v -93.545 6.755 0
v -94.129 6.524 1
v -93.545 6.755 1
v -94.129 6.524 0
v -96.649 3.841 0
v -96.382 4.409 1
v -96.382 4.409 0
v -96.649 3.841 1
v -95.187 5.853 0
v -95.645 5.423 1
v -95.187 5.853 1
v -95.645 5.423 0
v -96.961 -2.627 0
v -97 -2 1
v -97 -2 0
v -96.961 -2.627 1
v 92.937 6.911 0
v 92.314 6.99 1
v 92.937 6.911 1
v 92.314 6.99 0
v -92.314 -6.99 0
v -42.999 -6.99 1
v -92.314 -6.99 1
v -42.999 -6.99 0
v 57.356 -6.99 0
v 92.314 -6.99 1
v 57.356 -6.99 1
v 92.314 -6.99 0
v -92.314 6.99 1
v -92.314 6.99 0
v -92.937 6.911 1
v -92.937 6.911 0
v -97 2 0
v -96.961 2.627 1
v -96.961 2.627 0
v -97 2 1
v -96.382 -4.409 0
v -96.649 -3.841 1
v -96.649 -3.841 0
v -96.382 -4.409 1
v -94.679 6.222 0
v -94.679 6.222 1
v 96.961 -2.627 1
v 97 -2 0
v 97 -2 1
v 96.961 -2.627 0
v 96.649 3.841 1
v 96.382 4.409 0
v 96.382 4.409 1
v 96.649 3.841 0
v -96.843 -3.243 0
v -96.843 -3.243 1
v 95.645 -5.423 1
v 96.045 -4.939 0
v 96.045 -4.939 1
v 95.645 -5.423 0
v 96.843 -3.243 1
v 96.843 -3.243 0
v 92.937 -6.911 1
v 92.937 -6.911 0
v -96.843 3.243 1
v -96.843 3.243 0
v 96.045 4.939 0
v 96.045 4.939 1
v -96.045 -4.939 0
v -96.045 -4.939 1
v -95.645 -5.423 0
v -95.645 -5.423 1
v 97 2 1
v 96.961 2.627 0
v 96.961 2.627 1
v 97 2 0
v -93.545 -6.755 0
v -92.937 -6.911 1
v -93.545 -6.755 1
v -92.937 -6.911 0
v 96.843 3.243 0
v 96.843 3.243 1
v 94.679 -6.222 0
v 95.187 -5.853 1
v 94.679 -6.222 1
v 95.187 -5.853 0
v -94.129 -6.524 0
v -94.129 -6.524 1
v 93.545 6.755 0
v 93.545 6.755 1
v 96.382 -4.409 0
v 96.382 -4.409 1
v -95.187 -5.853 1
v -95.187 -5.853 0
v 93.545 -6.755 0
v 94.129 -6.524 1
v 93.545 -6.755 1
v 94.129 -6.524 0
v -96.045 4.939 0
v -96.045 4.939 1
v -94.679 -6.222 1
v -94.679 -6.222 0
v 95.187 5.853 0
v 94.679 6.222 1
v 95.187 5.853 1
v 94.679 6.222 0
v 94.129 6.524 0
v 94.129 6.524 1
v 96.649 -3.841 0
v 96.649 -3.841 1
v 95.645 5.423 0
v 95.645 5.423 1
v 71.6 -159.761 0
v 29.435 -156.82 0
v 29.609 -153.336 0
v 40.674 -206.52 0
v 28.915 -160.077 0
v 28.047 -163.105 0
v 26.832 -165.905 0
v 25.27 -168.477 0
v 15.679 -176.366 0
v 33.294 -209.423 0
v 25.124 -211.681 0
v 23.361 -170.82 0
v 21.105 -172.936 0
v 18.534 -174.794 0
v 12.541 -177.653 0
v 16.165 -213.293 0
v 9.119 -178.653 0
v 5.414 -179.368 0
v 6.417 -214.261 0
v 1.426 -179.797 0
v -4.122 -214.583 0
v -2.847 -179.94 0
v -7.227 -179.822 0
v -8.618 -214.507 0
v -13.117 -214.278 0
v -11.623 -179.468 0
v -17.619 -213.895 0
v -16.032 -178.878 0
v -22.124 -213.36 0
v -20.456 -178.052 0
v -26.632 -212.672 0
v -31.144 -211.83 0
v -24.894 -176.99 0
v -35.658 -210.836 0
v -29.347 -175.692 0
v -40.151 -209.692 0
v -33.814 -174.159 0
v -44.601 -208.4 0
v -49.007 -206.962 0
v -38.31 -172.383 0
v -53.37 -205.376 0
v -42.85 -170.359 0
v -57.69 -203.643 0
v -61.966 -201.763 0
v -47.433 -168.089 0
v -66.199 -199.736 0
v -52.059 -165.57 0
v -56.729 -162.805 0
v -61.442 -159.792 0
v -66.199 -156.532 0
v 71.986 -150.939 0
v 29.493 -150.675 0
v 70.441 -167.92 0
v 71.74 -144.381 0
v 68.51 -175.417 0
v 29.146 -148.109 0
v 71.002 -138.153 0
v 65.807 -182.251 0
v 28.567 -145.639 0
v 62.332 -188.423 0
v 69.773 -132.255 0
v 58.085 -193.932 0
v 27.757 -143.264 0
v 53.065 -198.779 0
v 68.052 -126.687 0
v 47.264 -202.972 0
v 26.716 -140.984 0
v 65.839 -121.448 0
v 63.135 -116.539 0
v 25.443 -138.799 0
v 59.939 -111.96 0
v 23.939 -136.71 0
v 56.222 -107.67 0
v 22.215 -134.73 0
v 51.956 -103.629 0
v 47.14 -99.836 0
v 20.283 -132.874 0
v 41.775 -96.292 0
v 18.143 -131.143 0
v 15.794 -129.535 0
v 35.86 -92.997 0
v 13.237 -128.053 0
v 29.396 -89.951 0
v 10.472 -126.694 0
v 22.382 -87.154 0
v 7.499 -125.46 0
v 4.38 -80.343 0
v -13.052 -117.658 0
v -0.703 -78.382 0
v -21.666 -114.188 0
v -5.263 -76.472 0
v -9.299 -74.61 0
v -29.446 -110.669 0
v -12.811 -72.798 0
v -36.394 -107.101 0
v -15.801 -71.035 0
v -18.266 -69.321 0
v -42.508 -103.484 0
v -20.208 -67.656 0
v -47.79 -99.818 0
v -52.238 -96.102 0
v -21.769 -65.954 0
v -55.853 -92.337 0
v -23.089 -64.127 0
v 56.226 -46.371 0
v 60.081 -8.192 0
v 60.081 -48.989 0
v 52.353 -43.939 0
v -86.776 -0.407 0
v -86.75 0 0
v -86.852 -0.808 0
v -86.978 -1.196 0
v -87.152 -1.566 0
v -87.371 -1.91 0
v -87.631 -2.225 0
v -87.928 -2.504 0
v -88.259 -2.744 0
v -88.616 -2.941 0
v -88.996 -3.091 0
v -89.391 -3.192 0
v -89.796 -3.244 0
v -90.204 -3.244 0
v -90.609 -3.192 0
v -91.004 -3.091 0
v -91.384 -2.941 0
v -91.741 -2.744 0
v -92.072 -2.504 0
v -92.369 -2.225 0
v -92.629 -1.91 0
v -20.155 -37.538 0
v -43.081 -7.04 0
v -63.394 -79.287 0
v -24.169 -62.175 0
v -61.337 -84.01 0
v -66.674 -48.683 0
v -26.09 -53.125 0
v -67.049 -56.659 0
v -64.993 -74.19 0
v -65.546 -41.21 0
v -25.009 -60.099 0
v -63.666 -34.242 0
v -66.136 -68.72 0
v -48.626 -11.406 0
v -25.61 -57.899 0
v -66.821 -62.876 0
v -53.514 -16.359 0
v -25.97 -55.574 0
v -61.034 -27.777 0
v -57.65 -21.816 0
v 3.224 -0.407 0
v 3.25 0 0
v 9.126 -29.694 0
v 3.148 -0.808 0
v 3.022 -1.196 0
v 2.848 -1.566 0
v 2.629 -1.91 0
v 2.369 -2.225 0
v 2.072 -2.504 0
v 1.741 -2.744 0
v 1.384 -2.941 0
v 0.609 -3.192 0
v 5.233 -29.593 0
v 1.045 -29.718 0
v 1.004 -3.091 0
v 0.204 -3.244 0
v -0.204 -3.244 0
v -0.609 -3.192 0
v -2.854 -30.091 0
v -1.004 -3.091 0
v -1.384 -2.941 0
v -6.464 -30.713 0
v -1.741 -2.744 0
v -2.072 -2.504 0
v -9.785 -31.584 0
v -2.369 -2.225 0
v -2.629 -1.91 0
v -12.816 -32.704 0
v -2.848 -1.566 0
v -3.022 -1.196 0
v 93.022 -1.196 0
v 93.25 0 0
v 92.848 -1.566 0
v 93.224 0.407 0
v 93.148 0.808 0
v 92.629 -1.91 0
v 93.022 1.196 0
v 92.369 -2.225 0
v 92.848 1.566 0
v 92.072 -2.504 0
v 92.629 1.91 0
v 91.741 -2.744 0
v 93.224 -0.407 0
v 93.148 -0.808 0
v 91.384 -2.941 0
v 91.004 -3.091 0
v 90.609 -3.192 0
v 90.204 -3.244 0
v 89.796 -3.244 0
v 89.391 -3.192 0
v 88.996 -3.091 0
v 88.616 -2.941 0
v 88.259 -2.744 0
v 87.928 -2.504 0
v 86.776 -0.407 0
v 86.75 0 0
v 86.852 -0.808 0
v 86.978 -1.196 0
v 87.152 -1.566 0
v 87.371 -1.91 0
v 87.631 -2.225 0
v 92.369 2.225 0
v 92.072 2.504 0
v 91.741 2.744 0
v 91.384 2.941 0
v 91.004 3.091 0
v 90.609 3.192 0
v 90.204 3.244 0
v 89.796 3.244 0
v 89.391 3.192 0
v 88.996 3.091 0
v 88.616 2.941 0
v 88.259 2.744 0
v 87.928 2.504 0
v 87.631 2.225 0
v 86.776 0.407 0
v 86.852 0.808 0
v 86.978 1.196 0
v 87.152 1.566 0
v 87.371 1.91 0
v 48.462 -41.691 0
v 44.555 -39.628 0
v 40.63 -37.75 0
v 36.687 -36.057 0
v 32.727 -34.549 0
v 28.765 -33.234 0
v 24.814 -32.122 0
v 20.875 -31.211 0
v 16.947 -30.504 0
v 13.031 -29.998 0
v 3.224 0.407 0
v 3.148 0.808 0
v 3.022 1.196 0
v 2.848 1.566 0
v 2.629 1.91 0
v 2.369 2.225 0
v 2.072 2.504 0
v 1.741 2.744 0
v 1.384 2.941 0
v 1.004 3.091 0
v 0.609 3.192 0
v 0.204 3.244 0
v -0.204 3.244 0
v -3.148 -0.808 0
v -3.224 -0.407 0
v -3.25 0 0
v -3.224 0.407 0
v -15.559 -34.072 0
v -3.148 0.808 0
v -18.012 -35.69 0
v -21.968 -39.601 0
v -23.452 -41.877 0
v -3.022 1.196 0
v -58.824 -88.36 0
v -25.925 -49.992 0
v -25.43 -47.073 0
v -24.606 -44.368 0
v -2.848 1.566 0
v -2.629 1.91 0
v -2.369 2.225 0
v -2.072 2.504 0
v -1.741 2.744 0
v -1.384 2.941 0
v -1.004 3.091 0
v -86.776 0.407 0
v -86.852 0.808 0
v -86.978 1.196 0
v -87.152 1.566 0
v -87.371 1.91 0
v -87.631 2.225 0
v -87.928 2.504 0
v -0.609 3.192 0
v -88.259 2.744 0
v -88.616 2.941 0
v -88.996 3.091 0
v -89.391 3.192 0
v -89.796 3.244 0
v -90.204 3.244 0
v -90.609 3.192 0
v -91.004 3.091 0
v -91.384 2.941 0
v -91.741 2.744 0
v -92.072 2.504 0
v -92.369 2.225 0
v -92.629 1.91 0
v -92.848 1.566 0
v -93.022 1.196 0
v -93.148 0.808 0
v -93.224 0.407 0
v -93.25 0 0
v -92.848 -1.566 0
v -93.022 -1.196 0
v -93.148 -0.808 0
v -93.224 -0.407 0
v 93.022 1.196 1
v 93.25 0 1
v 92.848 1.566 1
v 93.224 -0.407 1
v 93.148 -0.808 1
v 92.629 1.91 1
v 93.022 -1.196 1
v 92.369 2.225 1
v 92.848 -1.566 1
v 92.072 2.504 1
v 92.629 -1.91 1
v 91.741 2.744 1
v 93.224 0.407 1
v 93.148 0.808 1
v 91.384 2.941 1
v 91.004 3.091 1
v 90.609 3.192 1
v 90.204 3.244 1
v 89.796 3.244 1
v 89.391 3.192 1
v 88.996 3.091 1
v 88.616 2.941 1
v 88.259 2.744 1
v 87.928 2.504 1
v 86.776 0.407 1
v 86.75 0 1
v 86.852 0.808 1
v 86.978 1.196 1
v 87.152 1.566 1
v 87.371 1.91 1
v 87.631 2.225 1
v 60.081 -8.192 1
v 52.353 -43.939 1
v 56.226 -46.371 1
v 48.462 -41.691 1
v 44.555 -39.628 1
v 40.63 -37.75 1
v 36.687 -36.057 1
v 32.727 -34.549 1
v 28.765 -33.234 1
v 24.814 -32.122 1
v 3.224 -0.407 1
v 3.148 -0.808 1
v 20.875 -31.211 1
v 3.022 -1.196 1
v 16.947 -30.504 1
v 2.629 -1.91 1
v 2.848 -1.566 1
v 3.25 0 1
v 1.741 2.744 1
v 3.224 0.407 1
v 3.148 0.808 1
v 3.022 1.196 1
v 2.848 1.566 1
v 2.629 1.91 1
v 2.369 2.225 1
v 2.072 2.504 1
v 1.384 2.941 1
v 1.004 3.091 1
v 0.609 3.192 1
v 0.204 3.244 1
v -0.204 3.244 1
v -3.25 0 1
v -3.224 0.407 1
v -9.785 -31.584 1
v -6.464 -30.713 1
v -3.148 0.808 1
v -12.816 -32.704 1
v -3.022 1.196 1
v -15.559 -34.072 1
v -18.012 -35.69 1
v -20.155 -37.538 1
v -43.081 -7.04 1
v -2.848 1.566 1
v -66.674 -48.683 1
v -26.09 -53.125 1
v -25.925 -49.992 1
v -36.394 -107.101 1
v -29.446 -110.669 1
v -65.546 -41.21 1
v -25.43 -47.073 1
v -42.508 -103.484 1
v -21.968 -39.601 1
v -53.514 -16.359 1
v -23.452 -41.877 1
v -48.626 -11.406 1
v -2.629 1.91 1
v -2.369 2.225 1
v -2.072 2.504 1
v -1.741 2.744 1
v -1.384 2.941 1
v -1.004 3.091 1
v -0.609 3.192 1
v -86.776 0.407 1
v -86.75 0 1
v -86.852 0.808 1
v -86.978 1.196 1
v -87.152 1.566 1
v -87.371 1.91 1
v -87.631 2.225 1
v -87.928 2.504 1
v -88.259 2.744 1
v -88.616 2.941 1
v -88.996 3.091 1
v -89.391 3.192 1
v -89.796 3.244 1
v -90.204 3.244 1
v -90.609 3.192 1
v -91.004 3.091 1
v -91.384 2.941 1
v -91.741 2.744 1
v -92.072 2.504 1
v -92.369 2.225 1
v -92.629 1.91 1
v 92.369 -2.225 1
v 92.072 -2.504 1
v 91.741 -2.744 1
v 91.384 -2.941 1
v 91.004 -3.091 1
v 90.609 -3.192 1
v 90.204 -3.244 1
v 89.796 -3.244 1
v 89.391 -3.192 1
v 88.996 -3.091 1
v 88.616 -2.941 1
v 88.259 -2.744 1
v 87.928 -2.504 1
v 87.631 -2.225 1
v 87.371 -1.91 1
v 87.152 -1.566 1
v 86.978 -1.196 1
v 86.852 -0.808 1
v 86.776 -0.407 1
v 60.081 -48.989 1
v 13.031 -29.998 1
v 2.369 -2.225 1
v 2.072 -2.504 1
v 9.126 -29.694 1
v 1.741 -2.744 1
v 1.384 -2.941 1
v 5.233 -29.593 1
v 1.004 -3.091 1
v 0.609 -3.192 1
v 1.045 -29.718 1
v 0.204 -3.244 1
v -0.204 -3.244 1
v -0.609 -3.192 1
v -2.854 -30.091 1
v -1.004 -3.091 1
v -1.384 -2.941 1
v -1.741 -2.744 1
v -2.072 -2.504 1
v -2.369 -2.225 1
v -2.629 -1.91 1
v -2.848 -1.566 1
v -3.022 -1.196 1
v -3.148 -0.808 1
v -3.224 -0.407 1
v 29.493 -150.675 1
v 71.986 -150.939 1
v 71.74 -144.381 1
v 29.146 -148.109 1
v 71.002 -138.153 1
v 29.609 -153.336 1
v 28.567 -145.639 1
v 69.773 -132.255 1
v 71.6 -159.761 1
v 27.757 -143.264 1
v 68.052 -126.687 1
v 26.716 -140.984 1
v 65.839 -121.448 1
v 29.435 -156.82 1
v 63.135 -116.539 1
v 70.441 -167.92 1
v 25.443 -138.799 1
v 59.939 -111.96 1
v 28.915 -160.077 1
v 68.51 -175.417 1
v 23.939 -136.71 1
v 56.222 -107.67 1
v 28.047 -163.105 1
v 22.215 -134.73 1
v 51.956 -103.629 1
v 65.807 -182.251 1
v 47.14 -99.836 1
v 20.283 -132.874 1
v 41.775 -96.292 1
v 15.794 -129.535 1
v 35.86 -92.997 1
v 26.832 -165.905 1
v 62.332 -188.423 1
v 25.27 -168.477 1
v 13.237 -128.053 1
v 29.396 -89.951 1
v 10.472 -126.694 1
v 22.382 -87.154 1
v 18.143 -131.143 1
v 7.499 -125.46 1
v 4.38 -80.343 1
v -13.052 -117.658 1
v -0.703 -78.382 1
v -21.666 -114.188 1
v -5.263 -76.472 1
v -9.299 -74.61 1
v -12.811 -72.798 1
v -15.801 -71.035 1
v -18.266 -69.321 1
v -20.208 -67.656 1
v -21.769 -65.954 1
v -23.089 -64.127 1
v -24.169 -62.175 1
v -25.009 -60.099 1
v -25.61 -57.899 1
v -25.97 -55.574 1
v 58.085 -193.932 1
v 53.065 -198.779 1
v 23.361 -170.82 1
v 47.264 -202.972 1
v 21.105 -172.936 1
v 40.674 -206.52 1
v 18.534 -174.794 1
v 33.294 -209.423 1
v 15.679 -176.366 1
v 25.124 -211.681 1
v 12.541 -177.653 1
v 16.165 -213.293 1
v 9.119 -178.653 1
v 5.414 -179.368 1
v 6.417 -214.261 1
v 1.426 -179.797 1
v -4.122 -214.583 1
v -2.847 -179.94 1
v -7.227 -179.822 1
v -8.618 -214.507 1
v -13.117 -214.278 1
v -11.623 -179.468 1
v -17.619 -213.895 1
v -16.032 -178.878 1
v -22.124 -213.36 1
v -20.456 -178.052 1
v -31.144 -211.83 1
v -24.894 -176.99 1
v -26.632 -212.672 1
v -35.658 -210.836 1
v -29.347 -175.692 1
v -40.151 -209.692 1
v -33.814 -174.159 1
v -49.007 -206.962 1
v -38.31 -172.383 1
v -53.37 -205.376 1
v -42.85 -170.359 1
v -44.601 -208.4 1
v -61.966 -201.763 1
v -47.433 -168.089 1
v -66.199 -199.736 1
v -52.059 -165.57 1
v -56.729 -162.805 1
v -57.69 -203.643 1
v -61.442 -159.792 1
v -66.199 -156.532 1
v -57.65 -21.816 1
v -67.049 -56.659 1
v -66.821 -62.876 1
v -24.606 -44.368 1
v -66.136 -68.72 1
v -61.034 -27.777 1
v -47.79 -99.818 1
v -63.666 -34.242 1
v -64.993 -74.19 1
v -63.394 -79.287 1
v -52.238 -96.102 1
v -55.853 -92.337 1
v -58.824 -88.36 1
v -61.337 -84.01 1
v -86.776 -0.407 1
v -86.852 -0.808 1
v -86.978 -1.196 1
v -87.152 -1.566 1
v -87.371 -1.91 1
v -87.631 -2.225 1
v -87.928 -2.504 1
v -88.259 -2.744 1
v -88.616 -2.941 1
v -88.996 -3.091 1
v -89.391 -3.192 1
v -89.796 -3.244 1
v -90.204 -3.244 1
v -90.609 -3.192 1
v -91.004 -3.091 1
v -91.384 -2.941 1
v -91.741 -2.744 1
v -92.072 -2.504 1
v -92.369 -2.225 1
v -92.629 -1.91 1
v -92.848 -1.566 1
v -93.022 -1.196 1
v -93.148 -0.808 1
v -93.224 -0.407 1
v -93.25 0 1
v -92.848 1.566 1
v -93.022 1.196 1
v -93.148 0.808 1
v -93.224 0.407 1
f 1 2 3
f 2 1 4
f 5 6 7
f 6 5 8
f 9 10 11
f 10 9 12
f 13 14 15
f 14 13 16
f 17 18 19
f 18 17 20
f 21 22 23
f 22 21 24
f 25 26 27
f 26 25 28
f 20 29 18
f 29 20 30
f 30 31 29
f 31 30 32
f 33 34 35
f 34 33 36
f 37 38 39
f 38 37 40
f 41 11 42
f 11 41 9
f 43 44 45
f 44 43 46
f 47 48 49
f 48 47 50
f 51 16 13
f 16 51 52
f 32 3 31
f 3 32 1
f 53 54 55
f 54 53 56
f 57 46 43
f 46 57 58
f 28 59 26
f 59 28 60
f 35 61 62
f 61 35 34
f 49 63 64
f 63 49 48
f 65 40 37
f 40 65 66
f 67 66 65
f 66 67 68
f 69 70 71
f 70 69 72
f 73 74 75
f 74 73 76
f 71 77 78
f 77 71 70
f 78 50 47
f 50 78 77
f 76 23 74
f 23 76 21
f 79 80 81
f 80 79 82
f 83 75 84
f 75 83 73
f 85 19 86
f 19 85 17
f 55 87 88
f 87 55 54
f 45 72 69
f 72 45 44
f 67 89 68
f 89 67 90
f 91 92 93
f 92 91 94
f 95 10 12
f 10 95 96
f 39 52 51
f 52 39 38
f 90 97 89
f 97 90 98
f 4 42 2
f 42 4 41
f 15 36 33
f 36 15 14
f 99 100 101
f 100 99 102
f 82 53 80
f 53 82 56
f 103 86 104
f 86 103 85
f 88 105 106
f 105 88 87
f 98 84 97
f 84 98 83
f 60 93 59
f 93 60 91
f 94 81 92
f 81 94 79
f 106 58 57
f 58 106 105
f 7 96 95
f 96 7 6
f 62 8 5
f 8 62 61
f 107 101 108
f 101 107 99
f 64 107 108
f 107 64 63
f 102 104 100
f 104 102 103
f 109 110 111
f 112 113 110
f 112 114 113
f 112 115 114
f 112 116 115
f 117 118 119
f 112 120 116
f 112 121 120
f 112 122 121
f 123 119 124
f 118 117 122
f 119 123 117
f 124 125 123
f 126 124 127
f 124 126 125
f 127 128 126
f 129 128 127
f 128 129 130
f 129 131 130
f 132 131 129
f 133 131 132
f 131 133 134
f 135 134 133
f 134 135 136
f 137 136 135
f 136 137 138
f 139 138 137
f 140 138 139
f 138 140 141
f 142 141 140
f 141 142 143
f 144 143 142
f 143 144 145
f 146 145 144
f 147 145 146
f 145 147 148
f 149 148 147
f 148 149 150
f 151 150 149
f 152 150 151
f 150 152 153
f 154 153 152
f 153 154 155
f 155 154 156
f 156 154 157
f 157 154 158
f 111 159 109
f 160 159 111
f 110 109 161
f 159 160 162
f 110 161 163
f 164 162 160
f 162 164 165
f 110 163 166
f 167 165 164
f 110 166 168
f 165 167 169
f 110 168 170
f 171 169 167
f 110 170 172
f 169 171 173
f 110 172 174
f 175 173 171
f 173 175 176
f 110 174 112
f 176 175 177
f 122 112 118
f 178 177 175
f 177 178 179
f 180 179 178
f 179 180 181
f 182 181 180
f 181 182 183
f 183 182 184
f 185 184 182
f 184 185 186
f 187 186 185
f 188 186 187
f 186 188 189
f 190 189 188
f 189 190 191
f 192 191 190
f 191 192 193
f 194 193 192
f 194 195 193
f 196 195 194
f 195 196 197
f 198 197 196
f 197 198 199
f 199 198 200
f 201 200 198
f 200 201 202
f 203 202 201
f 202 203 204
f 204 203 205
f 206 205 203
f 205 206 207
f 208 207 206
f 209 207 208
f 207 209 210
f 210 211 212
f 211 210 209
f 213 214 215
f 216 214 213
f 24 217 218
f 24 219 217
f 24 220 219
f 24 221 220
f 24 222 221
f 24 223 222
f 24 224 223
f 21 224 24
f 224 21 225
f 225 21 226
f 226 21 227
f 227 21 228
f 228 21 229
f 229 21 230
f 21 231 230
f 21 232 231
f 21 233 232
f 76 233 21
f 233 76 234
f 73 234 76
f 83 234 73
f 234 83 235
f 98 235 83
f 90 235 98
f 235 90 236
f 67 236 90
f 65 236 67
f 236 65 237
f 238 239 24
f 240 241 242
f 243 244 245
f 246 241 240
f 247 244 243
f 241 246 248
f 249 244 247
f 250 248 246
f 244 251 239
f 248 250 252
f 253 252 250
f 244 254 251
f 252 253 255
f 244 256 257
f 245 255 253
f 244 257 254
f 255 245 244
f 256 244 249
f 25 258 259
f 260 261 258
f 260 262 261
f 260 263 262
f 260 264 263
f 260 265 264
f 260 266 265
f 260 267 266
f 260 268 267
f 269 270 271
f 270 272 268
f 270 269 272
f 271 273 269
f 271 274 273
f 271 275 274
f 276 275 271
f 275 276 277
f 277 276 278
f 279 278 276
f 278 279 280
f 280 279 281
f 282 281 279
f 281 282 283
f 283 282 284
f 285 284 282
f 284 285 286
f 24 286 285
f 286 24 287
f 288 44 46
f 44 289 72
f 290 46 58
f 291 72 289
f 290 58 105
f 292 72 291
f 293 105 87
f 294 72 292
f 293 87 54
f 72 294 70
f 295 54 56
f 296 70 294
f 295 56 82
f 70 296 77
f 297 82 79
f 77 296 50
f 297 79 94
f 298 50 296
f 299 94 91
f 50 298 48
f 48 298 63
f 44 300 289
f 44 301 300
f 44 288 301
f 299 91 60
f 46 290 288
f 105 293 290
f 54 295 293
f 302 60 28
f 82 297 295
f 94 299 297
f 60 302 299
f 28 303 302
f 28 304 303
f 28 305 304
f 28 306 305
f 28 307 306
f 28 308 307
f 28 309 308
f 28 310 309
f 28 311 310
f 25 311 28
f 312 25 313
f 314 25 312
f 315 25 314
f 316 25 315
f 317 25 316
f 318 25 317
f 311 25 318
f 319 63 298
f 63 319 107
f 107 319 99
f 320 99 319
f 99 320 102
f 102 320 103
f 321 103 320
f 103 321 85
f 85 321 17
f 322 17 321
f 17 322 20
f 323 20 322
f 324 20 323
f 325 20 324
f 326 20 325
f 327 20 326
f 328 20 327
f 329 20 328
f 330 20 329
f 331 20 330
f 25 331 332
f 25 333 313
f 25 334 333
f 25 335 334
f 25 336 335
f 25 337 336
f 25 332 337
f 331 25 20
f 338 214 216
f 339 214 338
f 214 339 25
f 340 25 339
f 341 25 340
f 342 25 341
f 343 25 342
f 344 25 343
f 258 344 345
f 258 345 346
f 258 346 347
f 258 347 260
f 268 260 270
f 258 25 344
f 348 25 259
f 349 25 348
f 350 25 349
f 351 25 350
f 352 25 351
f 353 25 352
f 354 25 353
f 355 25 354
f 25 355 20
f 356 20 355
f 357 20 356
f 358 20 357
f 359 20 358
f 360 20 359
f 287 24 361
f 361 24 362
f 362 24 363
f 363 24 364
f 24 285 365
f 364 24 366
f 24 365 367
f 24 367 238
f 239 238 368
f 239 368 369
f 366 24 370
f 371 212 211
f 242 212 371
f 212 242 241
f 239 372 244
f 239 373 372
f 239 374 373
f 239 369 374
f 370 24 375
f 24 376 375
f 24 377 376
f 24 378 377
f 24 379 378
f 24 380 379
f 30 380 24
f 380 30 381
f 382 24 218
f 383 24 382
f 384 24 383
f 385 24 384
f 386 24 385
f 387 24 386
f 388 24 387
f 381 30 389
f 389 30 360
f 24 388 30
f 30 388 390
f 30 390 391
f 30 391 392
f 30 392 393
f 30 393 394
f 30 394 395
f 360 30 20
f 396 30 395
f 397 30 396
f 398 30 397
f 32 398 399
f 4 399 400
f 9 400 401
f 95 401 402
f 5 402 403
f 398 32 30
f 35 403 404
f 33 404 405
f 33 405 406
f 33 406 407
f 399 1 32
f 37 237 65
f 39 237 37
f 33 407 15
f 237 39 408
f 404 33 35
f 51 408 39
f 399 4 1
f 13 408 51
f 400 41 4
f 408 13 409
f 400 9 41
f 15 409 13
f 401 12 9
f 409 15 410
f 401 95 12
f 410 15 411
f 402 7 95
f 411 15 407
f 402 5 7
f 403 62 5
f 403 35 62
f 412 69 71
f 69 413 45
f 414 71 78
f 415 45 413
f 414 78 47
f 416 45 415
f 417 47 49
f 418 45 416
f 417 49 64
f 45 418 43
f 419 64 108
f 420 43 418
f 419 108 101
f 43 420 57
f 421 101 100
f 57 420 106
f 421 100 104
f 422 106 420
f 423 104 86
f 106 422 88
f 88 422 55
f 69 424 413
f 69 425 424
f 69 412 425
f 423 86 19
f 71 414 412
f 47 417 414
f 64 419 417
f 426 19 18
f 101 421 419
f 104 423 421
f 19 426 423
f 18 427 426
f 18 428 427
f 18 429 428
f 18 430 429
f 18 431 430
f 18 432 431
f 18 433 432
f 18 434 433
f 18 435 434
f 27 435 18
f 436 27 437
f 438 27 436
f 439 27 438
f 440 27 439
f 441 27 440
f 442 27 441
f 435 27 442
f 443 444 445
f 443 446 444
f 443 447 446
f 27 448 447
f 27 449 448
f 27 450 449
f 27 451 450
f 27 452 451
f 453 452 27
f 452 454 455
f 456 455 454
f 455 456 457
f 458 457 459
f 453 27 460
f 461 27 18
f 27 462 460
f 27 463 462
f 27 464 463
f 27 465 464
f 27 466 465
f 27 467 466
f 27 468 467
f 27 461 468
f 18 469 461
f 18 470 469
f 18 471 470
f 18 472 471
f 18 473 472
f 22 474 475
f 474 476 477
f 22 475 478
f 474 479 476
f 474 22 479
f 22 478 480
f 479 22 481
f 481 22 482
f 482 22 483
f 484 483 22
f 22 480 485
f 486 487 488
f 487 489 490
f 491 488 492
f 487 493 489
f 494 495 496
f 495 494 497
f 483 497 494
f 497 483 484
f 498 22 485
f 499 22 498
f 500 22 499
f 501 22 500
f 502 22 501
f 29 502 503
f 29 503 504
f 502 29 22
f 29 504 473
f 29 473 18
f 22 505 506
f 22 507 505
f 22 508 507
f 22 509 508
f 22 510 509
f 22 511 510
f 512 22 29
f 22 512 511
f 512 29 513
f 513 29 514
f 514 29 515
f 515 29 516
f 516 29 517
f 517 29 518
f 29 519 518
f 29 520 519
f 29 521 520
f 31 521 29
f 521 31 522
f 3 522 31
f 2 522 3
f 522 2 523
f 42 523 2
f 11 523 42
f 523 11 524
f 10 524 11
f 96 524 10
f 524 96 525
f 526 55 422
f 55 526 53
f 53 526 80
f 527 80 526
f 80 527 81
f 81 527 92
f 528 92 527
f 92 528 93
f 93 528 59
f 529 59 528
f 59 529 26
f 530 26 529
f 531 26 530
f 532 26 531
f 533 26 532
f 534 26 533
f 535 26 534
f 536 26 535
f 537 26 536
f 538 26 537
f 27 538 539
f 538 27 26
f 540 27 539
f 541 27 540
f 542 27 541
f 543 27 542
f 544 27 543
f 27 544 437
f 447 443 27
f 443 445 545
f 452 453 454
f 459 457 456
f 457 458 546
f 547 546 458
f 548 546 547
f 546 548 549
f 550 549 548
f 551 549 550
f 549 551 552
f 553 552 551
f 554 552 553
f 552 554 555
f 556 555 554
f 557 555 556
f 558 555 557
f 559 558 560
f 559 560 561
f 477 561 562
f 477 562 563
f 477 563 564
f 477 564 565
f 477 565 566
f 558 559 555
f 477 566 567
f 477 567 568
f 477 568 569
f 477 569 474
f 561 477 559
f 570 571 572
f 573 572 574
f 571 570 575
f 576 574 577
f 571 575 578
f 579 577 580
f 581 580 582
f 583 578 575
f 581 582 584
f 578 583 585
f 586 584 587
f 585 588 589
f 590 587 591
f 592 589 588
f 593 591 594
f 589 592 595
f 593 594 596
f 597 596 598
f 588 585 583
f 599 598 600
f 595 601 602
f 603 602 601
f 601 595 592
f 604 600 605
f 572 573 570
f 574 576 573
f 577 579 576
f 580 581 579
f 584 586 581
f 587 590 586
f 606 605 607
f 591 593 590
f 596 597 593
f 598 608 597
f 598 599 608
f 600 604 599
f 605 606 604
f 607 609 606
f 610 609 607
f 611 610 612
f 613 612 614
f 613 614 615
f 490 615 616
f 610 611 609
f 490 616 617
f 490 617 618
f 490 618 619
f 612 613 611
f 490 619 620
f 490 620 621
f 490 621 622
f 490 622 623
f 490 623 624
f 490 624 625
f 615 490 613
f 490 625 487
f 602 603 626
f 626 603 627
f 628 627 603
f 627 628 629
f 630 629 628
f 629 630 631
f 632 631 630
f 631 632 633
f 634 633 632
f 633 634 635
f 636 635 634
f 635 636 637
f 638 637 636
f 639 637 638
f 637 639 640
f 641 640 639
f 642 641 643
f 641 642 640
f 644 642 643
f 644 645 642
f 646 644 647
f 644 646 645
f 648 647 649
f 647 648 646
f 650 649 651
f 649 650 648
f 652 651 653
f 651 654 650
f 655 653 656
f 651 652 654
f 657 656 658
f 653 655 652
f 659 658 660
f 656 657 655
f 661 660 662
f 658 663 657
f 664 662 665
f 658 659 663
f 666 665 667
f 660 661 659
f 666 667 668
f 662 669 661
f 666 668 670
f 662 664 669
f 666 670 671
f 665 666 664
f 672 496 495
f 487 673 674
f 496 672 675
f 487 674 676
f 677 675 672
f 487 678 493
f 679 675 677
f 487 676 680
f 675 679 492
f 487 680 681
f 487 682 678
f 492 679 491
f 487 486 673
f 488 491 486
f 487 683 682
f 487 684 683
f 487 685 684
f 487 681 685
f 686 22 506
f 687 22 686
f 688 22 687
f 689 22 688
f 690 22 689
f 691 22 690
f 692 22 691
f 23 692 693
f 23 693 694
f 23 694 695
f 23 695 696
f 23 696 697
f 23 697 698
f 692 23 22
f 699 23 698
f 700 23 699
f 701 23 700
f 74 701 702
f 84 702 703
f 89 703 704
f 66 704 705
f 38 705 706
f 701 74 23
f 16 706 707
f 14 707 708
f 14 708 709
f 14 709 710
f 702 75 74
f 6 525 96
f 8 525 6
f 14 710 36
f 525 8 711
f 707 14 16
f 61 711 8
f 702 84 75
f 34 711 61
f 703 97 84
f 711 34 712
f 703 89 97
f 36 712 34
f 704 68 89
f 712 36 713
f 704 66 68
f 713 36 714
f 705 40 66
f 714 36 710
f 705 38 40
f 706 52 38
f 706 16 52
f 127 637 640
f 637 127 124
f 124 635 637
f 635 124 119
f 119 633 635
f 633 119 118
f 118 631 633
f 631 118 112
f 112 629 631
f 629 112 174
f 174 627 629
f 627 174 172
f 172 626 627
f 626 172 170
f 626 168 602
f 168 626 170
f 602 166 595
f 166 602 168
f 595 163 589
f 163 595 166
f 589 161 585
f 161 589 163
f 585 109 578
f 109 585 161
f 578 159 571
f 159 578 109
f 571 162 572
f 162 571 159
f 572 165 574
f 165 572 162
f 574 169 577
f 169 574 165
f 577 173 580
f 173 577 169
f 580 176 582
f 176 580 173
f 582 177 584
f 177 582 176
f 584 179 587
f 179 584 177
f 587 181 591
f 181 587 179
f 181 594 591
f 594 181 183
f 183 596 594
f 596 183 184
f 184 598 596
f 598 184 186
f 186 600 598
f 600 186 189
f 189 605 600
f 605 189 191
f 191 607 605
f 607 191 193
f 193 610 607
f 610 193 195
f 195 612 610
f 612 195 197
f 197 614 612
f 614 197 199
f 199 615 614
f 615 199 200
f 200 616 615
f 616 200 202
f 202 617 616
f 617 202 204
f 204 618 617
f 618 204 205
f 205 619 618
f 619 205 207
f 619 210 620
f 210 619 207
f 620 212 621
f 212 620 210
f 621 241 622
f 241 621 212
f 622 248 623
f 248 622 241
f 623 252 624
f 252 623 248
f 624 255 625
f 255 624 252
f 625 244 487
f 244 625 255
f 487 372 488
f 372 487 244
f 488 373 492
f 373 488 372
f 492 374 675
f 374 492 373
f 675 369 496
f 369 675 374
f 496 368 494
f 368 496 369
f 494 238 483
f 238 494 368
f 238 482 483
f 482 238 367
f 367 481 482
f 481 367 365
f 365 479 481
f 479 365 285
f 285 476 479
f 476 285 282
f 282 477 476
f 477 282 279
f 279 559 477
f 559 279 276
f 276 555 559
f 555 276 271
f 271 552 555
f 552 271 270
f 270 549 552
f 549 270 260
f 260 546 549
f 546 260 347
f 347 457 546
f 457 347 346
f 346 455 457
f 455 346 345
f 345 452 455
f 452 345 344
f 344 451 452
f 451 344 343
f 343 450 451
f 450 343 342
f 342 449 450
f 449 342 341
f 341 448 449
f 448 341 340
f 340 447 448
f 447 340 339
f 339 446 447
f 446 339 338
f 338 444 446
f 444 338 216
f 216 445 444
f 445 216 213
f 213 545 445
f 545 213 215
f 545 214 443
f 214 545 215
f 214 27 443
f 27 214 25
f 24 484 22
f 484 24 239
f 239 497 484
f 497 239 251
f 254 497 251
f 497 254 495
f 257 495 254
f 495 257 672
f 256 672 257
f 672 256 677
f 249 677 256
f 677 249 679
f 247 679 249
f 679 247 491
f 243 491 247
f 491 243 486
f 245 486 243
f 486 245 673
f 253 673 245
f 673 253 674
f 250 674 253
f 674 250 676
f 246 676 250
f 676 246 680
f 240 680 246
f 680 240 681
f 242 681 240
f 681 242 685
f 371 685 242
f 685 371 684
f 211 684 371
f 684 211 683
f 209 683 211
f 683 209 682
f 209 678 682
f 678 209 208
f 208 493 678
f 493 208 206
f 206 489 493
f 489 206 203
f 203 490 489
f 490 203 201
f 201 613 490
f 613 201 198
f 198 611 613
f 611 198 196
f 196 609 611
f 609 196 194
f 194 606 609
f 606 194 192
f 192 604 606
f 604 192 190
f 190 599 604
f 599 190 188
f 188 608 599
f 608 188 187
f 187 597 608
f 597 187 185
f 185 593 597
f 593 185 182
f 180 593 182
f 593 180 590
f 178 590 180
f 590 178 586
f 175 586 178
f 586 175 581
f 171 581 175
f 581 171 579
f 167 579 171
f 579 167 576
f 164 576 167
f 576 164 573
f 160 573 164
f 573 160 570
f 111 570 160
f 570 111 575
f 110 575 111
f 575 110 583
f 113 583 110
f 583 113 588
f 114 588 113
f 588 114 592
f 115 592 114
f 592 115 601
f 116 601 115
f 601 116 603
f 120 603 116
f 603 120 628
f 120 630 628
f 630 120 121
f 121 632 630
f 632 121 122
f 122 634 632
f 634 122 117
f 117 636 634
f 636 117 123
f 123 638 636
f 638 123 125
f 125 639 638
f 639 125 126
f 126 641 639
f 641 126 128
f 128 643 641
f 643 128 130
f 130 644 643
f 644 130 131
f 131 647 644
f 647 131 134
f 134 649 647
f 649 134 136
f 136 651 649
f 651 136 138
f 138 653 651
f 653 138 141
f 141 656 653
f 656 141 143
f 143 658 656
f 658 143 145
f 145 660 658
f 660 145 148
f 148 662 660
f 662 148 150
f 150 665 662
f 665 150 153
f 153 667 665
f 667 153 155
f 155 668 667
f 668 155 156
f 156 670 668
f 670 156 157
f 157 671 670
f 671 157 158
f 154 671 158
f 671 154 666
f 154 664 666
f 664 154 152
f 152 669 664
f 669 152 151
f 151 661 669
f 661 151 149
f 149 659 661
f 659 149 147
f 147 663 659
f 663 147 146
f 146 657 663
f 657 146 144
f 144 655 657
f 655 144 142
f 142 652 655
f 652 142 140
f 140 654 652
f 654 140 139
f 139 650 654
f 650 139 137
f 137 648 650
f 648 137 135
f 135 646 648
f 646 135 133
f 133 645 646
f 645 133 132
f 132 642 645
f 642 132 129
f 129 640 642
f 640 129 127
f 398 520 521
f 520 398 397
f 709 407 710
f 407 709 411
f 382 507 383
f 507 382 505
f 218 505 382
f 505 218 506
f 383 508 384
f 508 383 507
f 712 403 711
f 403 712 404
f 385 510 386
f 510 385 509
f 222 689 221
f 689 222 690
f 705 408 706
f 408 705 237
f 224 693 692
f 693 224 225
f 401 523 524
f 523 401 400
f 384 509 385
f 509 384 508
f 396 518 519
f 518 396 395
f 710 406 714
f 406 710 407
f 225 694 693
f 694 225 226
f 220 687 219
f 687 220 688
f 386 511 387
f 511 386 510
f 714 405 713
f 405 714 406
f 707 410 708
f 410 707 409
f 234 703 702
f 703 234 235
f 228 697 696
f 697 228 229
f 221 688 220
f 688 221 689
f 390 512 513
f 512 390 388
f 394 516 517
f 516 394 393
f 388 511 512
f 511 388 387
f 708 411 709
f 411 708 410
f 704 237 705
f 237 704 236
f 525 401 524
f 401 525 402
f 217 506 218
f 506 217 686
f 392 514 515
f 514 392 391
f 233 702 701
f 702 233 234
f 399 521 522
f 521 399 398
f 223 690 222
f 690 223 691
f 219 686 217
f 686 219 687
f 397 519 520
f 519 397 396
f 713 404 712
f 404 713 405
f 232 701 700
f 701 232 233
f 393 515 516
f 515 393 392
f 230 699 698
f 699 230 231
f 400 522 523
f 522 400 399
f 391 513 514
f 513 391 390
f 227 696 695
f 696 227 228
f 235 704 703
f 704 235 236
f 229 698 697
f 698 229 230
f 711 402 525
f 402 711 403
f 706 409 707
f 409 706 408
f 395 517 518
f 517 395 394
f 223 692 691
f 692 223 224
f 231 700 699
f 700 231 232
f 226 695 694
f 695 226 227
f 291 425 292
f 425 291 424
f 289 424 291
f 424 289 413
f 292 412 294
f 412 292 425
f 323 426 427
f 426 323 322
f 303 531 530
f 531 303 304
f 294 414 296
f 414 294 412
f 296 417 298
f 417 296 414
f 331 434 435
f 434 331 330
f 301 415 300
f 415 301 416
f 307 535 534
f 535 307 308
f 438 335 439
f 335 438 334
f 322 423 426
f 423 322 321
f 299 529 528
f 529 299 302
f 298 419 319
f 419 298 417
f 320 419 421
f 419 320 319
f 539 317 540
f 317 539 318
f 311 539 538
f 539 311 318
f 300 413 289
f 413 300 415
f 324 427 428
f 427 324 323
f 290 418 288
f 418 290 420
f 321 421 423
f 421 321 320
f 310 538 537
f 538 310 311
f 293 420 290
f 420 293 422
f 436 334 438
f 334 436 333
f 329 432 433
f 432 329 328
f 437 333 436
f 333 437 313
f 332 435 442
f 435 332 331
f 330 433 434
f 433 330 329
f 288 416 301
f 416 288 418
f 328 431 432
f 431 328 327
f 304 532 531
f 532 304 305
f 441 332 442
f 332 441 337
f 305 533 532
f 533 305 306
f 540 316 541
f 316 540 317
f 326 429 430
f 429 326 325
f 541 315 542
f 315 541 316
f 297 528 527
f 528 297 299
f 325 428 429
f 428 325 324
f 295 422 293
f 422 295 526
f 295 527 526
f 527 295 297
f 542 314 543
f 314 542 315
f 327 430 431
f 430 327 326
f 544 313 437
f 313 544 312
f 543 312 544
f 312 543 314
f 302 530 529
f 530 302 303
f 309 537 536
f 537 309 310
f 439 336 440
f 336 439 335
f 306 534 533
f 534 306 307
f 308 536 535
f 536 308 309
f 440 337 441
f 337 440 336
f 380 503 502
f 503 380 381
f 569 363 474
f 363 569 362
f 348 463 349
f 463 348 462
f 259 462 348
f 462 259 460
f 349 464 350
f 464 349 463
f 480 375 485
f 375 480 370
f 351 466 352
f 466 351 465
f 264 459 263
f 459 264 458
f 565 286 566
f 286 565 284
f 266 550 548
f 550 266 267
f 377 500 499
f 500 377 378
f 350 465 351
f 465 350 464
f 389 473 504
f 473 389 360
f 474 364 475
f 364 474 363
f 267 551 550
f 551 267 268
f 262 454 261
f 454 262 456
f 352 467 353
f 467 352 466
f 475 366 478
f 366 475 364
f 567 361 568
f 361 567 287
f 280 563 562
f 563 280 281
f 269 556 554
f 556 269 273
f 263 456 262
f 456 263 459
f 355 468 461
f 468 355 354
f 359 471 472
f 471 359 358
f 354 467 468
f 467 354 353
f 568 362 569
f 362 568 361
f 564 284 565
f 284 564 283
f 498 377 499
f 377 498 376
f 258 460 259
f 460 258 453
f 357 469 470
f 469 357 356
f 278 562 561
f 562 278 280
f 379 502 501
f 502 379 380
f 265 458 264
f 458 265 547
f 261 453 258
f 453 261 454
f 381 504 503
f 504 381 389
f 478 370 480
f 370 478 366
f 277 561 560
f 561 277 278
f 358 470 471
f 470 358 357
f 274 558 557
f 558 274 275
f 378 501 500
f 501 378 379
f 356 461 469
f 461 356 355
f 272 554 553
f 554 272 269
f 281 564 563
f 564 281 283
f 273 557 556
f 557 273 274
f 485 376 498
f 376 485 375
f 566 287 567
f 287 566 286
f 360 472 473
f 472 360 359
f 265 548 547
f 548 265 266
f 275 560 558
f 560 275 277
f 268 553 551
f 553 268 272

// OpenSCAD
$fn = 50;


difference() {
	union() {
		translate(v = [0, 0, 0]) {
			rotate(a = [0, 0, 0]) {
				hull() {
					translate(v = [-92.0000000000, 2.0000000000, 0]) {
						rotate(a = [0, 0, 0]) {
							translate(v = [0, 0, 0]) {
								rotate(a = [0, 0, 0]) {
									cylinder(h = 1, r = 5);
								}
							}
						}
					}
					translate(v = [92.0000000000, 2.0000000000, 0]) {
						rotate(a = [0, 0, 0]) {
							translate(v = [0, 0, 0]) {
								rotate(a = [0, 0, 0]) {
									cylinder(h = 1, r = 5);
								}
							}
						}
					}
					translate(v = [-92.0000000000, -2.0000000000, 0]) {
						rotate(a = [0, 0, 0]) {
							translate(v = [0, 0, 0]) {
								rotate(a = [0, 0, 0]) {
									cylinder(h = 1, r = 5);
								}
							}
						}
					}
					translate(v = [92.0000000000, -2.0000000000, 0]) {
						rotate(a = [0, 0, 0]) {
							translate(v = [0, 0, 0]) {
								rotate(a = [0, 0, 0]) {
									cylinder(h = 1, r = 5);
								}
							}
						}
					}
				}
			}
		}
		translate(v = [0, 0, 0]) {
			rotate(a = [0, 0, 0]) {
				linear_extrude(height = 1) {
					text(font = "DejaVu Sans Mono:style=Bold", halign = "center", size = 209.0000000000, text = "S", valign = "top");
				}
			}
		}
	}
	union() {
		translate(v = [-90.0000000000, 0.0000000000, -125.0000000000]) {
			rotate(a = [0, 0, 0]) {
				cylinder(h = 250, r = 3.2500000000);
			}
		}
		translate(v = [90.0000000000, 0.0000000000, -125.0000000000]) {
			rotate(a = [0, 0, 0]) {
				cylinder(h = 250, r = 3.2500000000);
			}
		}
		translate(v = [90.0000000000, 0.0000000000, -125.0000000000]) {
			rotate(a = [0, 0, 0]) {
				cylinder(h = 250, r = 3.2500000000);
			}
		}
		translate(v = [0, 0, -125.0000000000]) {
			rotate(a = [0, 0, 0]) {
				cylinder(h = 250, r = 3.2500000000);
			}
		}
	}
}
